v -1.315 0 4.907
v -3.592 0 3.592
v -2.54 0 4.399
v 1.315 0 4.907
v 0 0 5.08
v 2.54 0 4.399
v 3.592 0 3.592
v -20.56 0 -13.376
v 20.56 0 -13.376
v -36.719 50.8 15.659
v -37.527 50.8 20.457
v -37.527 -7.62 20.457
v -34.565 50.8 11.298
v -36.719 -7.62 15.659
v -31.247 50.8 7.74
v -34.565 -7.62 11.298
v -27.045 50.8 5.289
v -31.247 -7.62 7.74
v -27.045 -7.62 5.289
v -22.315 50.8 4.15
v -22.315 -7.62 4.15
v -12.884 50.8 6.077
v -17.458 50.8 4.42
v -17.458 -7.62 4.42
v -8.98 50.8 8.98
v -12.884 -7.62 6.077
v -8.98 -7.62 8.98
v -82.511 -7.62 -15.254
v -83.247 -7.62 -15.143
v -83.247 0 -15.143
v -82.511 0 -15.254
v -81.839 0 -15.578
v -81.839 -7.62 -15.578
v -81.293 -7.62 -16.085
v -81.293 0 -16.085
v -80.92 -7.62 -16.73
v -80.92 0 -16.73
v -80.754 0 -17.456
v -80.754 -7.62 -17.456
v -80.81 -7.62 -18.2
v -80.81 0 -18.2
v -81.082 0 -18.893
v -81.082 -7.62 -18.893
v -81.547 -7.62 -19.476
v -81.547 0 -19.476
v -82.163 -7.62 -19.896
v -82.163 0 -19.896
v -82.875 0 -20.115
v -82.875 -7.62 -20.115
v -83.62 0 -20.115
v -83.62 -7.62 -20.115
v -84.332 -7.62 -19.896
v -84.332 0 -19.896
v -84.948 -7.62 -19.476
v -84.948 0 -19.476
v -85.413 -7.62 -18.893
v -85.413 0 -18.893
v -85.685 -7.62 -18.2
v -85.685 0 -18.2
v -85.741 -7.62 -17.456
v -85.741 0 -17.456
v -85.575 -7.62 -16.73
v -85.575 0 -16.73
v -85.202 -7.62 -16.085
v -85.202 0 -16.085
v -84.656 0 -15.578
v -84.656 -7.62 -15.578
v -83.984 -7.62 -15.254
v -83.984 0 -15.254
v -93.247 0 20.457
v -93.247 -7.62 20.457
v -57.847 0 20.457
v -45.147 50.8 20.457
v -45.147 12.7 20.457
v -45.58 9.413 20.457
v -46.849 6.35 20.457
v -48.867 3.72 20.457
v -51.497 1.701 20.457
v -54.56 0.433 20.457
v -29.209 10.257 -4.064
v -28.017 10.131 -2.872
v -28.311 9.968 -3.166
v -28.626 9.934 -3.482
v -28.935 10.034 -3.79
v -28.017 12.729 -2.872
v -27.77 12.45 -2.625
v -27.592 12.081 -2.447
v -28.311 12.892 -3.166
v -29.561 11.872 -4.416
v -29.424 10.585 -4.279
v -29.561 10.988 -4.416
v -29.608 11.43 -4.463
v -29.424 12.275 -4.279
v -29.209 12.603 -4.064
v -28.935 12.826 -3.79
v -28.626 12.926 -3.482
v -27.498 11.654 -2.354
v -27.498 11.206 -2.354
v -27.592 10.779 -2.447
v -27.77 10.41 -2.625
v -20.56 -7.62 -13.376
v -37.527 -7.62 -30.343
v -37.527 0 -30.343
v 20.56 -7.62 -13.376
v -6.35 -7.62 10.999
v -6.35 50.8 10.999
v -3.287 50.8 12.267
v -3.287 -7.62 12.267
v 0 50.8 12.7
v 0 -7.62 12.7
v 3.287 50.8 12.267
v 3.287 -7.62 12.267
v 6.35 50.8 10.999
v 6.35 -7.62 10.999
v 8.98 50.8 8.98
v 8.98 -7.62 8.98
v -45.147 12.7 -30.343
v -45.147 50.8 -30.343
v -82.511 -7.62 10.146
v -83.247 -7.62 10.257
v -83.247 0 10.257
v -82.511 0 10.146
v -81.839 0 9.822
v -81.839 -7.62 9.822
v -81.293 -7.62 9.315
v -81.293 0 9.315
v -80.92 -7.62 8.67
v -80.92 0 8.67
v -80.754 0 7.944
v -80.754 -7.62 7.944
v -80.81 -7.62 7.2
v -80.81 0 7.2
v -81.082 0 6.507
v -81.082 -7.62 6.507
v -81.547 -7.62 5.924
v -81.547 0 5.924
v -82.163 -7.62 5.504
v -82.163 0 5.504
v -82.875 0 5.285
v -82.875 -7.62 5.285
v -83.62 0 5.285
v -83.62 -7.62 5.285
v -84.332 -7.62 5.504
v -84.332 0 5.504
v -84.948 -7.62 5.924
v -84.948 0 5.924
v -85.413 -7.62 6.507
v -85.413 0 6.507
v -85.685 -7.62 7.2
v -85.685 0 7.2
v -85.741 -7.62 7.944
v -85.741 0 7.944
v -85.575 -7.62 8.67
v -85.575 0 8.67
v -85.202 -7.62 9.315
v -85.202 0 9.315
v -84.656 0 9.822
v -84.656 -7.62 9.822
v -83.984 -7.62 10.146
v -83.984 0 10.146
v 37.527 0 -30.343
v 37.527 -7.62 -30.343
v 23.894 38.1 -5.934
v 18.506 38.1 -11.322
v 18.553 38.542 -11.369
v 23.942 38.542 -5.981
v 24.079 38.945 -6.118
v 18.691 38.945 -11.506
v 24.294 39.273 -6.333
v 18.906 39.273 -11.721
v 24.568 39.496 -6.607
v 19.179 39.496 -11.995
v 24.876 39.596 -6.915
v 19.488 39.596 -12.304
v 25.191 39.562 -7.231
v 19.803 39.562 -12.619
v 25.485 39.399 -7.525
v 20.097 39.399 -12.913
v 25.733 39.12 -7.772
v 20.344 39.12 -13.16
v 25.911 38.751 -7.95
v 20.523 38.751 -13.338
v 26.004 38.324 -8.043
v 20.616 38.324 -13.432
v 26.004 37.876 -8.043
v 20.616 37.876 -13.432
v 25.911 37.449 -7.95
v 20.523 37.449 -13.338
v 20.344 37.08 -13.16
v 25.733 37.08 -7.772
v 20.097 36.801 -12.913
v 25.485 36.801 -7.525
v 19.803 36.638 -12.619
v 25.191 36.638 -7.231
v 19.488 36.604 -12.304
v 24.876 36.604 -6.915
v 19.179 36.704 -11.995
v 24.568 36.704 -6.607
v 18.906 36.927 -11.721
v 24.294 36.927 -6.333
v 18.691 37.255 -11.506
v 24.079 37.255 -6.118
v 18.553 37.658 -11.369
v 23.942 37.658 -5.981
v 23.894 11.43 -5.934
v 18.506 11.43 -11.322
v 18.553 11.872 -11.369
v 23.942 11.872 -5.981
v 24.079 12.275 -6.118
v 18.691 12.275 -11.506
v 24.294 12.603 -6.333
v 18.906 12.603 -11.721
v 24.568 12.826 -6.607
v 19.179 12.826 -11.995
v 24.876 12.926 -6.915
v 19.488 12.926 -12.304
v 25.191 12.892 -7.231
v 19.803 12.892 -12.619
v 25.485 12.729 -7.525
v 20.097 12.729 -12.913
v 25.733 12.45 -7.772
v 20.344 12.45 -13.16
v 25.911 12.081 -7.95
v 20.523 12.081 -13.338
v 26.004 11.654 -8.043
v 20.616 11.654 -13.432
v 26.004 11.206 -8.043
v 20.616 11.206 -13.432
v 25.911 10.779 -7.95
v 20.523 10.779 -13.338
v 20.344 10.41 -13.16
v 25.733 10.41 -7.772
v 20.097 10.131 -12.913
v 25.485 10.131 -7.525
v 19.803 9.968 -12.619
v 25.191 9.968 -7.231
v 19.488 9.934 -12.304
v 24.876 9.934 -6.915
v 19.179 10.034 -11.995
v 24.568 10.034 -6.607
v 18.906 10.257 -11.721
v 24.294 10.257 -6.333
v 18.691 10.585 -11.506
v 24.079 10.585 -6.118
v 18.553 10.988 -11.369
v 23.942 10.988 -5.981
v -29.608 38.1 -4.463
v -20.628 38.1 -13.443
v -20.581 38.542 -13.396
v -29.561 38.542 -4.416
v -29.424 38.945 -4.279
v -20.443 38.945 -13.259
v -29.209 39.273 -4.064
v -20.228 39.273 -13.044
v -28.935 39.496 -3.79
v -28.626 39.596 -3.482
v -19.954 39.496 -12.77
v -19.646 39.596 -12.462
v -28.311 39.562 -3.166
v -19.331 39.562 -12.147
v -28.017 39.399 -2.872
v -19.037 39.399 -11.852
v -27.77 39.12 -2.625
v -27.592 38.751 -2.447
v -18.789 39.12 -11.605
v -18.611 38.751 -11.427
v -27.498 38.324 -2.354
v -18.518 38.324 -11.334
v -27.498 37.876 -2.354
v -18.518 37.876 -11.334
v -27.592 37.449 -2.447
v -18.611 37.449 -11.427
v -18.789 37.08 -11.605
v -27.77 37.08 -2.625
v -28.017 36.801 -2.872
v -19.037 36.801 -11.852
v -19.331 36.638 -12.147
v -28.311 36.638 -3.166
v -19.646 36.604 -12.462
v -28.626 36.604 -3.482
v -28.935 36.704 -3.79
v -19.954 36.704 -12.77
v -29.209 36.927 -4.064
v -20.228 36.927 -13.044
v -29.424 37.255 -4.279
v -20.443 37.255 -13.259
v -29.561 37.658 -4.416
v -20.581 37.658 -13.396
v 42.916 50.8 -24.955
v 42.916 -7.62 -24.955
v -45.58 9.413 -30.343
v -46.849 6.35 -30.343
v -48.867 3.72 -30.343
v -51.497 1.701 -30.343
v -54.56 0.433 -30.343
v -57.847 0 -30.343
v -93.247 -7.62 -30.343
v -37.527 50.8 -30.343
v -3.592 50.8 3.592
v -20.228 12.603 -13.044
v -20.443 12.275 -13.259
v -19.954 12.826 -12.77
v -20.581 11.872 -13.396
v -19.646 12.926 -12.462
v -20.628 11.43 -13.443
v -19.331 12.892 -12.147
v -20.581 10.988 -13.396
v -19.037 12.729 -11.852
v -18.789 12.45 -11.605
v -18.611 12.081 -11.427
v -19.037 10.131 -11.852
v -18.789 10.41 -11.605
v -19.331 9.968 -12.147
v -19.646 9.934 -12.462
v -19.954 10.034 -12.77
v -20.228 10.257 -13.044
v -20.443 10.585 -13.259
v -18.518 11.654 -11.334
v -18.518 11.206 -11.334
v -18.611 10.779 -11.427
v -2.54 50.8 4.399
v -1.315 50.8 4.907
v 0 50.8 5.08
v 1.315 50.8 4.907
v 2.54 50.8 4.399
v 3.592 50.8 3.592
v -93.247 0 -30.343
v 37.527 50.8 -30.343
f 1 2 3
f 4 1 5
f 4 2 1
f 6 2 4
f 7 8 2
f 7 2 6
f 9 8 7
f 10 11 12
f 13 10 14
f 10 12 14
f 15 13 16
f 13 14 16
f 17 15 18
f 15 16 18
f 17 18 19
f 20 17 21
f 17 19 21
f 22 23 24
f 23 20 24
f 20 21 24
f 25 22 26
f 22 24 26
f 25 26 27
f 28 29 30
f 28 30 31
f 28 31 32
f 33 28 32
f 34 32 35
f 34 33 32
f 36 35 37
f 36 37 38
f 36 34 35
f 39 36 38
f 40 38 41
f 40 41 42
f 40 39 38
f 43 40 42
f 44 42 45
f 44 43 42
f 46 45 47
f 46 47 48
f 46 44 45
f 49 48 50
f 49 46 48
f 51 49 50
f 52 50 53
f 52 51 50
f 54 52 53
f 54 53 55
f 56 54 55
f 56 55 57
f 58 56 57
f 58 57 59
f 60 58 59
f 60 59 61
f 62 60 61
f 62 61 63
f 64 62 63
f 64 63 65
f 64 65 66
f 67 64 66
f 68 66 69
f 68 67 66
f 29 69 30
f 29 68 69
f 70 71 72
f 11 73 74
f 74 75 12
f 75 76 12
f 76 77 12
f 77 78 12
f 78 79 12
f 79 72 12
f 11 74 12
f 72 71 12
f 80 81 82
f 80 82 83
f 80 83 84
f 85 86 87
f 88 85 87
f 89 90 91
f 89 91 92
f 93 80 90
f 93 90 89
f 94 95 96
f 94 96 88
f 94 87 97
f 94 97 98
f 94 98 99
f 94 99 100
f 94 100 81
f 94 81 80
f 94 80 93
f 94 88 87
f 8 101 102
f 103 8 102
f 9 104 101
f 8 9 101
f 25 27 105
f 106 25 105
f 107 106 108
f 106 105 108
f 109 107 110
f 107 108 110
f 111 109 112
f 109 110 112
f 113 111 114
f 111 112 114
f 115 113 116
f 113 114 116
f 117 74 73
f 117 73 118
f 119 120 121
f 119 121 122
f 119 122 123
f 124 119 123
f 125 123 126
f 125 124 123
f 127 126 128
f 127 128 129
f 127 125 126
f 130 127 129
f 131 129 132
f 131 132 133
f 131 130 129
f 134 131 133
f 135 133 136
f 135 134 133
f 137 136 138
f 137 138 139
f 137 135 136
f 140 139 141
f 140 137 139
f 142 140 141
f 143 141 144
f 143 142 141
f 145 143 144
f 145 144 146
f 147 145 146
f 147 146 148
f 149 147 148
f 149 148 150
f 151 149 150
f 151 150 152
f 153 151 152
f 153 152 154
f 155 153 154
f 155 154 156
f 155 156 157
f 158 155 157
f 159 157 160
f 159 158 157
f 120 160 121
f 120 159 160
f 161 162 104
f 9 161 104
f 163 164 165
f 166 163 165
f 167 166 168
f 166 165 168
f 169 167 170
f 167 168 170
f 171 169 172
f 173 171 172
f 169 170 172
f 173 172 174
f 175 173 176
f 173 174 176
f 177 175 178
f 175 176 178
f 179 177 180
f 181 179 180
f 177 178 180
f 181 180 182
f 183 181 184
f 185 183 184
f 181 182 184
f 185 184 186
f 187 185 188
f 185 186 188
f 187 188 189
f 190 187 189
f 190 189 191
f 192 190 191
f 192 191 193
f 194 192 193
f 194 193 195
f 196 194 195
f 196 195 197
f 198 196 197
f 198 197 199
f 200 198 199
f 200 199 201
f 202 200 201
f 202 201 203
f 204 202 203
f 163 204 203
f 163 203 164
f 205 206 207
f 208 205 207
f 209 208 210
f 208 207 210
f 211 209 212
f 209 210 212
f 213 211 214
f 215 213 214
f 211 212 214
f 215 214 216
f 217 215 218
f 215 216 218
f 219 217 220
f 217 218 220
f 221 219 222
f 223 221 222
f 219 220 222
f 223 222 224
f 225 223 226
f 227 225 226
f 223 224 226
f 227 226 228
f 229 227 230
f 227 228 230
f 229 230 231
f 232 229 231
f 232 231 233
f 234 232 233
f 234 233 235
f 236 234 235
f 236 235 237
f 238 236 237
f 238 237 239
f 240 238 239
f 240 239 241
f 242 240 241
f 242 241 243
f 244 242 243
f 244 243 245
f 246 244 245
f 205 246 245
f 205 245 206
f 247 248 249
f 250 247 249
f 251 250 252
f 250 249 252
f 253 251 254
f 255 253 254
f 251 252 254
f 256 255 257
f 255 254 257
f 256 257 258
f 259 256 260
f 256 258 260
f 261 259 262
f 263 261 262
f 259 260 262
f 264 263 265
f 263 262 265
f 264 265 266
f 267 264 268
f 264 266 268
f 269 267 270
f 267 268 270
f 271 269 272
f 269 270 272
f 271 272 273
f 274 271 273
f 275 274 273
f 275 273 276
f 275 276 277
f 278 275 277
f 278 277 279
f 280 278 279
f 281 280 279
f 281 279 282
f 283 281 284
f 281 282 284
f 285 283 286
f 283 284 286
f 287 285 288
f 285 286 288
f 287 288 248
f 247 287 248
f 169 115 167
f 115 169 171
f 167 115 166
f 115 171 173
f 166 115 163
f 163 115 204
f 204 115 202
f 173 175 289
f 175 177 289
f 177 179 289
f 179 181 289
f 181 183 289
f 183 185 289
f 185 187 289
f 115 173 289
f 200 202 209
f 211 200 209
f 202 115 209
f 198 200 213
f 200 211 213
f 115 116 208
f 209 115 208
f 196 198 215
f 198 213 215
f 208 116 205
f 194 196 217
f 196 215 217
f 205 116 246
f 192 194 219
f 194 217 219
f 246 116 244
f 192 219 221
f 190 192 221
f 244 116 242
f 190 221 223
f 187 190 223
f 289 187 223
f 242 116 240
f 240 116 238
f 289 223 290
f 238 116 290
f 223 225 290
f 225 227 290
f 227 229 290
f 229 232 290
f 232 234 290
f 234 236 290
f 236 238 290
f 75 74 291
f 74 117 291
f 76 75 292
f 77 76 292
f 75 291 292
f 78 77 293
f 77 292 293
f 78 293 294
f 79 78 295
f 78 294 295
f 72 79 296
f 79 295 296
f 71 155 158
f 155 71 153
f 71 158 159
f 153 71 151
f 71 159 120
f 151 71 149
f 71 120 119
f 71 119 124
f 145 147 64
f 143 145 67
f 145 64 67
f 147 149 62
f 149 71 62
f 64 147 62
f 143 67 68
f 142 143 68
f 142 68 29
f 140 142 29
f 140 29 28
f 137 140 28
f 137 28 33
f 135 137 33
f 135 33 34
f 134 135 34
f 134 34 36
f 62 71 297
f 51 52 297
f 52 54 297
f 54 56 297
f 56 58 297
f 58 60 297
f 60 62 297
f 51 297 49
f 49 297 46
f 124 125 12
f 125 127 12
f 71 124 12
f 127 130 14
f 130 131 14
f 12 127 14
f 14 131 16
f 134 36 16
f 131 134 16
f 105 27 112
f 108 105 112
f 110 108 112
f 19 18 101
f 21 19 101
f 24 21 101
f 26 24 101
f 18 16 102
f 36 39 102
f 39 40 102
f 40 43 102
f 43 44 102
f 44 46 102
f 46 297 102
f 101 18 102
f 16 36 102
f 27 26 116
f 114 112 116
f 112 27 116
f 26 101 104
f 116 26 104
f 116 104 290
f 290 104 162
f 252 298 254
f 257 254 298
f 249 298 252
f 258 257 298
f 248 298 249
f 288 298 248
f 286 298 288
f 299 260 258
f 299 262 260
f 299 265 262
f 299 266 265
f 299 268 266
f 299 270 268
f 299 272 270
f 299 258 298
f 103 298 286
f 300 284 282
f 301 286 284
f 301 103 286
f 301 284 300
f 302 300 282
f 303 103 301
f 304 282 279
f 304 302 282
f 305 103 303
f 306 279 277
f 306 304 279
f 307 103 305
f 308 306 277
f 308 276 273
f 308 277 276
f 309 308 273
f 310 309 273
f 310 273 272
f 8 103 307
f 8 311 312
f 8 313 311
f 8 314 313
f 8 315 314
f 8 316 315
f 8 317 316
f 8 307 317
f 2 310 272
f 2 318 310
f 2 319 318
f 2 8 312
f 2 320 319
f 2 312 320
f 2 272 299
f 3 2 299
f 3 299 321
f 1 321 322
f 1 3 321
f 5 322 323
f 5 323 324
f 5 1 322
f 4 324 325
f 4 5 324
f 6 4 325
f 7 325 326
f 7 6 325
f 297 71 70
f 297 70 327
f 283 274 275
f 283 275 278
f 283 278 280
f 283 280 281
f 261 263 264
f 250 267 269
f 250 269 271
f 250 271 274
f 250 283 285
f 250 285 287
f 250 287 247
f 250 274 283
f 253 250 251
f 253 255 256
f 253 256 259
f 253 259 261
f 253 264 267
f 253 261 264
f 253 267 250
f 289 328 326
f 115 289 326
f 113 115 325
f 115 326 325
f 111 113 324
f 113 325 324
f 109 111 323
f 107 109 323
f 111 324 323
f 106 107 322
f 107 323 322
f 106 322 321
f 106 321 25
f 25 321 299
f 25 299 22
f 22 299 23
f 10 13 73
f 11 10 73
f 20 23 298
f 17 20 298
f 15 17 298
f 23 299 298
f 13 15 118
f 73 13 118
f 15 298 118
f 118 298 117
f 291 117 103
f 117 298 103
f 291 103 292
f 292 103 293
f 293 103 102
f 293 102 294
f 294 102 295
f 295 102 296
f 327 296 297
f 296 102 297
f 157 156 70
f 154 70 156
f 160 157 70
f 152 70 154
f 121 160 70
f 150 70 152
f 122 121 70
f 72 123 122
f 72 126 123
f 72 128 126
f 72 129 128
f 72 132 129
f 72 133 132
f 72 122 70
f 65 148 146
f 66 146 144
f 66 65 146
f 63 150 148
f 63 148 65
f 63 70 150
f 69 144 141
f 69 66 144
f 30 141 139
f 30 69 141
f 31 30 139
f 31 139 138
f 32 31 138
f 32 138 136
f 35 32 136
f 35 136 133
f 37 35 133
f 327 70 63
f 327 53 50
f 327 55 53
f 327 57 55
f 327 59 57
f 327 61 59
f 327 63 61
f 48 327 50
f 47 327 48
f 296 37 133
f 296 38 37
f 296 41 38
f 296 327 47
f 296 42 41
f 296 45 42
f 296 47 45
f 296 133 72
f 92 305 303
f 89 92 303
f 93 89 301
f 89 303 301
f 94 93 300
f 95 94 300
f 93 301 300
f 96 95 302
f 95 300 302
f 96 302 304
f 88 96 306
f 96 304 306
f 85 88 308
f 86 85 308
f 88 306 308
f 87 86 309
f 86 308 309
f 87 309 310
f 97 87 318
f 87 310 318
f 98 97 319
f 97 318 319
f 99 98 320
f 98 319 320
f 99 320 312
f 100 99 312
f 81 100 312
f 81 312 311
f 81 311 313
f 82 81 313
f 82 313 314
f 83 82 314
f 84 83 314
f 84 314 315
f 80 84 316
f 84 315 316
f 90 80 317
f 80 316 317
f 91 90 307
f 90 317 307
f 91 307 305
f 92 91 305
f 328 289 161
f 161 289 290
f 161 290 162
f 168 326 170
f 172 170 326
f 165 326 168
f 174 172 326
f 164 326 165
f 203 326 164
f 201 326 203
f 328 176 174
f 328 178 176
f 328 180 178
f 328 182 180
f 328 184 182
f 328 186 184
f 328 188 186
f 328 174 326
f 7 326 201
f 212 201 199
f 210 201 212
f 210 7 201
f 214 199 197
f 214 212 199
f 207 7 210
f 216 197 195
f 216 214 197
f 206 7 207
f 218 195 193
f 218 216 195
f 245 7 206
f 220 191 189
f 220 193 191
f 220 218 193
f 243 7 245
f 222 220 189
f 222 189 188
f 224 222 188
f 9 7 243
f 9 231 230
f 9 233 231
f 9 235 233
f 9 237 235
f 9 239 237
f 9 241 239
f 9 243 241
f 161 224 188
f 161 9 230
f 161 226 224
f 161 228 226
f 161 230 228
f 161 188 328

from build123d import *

# Parameters (mm, degrees)
BOSS_EXTRUDE1_DEPTH = 50.8
BOSS_EXTRUDE2_START = -7.62
SKETCH1_3_R         = 2.5
BOSS_EXTRUDE2_DEPTH = 7.62
SKETCH2_R           = 1.5
CUT_EXTRUDE1_DEPTH  = 12.7
SKETCH3_R           = 1.5
CUT_EXTRUDE2_DEPTH  = 12.7
FILLET1_R           = 12.7


with BuildPart() as part:
    # Sketch1 → Boss-Extrude1 (new body)
    with BuildSketch(Plane(origin=(0, 0, 0), x_dir=(1, 0, 0), z_dir=(0, 1, 0))):
        with BuildLine():
            Line((20.559796753, 13.375591856), (3.592102448, -3.592102448))
            ThreePointArc((3.592102448, -3.592102448), (0, -5.08), (-3.592102448, -3.592102448))
            Line((-3.592102448, -3.592102448), (-20.559796753, 13.375591856))
            Line((-20.559796753, 13.375591856), (-37.527491057, 30.34328616))
            Line((-37.527491057, 30.34328616), (-45.147491057, 30.34328616))
            Line((-45.147491057, 30.34328616), (-45.147491057, -20.45671384))
            Line((-45.147491057, -20.45671384), (-37.527491057, -20.45671384))
            ThreePointArc((-37.527491057, -20.45671384), (-27.044794722, -5.28871851), (-8.980256121, -8.980256121))
            ThreePointArc((-8.980256121, -8.980256121), (0, -12.7), (8.980256121, -8.980256121))
            Line((8.980256121, -8.980256121), (42.915644729, 24.955132487))
            Line((42.915644729, 24.955132487), (37.527491057, 30.34328616))
            Line((37.527491057, 30.34328616), (20.559796753, 13.375591856))
        make_face()
    extrude(amount=BOSS_EXTRUDE1_DEPTH)

    # Sketch1<3> → Boss-Extrude2 (add)
    with BuildSketch(Plane(origin=(0, 0, 0), x_dir=(1, 0, 0), z_dir=(0, 1, 0)).offset(BOSS_EXTRUDE2_START)):
        with BuildLine():
            Line((20.559796753, 13.375591856), (-20.559796753, 13.375591856))
            Line((-20.559796753, 13.375591856), (-37.527491057, 30.34328616))
            Line((-37.527491057, 30.34328616), (-93.247491057, 30.34328616))
            Line((-93.247491057, 30.34328616), (-93.247491057, -20.45671384))
            Line((-93.247491057, -20.45671384), (-37.527491057, -20.45671384))
            ThreePointArc((-37.527491057, -20.45671384), (-27.044794722, -5.28871851), (-8.980256121, -8.980256121))
            ThreePointArc((-8.980256121, -8.980256121), (0, -12.7), (8.980256121, -8.980256121))
            Line((8.980256121, -8.980256121), (42.915644729, 24.955132487))
            Line((42.915644729, 24.955132487), (37.527491057, 30.34328616))
            Line((37.527491057, 30.34328616), (20.559796753, 13.375591856))
        make_face()
        with Locations((-83.247491057, 17.64328616)):
            Circle(SKETCH1_3_R, mode=Mode.SUBTRACT)
        with Locations((-83.247491057, -7.75671384)):
            Circle(SKETCH1_3_R, mode=Mode.SUBTRACT)
    extrude(amount=BOSS_EXTRUDE2_DEPTH)

    # Sketch2 → Cut-Extrude1 (cut)
    with BuildSketch(Plane(origin=(-3.592102448, 0, 3.592102448), x_dir=(-0.7071067811865488, 0, -0.7071067811865464), z_dir=(0.7071067811865464, 0, -0.7071067811865488))):
        with Locations((22.591886814, 38.1)):
            Circle(SKETCH2_R)
        with Locations((22.591886814, 11.43)):
            Circle(SKETCH2_R)
    extrude(amount=-CUT_EXTRUDE1_DEPTH, mode=Mode.SUBTRACT)

    # Sketch3 → Cut-Extrude2 (cut)
    with BuildSketch(Plane(origin=(3.592102448, 0, 3.592102448), x_dir=(-0.7071067811865488, 0, 0.7071067811865464), z_dir=(-0.7071067811865464, 0, -0.7071067811865488))):
        with Locations((-22.591886814, 38.1)):
            Circle(SKETCH3_R)
        with Locations((-22.591886814, 11.43)):
            Circle(SKETCH3_R)
    extrude(amount=-CUT_EXTRUDE2_DEPTH, mode=Mode.SUBTRACT)

    # Fillet1
    fillet1_edges = [part.edges().sort_by_distance(p)[0] for p in [
        (-45.147491057, 0, -4.94328616),
    ]]
    fillet(fillet1_edges, radius=FILLET1_R)


solid = part.part
